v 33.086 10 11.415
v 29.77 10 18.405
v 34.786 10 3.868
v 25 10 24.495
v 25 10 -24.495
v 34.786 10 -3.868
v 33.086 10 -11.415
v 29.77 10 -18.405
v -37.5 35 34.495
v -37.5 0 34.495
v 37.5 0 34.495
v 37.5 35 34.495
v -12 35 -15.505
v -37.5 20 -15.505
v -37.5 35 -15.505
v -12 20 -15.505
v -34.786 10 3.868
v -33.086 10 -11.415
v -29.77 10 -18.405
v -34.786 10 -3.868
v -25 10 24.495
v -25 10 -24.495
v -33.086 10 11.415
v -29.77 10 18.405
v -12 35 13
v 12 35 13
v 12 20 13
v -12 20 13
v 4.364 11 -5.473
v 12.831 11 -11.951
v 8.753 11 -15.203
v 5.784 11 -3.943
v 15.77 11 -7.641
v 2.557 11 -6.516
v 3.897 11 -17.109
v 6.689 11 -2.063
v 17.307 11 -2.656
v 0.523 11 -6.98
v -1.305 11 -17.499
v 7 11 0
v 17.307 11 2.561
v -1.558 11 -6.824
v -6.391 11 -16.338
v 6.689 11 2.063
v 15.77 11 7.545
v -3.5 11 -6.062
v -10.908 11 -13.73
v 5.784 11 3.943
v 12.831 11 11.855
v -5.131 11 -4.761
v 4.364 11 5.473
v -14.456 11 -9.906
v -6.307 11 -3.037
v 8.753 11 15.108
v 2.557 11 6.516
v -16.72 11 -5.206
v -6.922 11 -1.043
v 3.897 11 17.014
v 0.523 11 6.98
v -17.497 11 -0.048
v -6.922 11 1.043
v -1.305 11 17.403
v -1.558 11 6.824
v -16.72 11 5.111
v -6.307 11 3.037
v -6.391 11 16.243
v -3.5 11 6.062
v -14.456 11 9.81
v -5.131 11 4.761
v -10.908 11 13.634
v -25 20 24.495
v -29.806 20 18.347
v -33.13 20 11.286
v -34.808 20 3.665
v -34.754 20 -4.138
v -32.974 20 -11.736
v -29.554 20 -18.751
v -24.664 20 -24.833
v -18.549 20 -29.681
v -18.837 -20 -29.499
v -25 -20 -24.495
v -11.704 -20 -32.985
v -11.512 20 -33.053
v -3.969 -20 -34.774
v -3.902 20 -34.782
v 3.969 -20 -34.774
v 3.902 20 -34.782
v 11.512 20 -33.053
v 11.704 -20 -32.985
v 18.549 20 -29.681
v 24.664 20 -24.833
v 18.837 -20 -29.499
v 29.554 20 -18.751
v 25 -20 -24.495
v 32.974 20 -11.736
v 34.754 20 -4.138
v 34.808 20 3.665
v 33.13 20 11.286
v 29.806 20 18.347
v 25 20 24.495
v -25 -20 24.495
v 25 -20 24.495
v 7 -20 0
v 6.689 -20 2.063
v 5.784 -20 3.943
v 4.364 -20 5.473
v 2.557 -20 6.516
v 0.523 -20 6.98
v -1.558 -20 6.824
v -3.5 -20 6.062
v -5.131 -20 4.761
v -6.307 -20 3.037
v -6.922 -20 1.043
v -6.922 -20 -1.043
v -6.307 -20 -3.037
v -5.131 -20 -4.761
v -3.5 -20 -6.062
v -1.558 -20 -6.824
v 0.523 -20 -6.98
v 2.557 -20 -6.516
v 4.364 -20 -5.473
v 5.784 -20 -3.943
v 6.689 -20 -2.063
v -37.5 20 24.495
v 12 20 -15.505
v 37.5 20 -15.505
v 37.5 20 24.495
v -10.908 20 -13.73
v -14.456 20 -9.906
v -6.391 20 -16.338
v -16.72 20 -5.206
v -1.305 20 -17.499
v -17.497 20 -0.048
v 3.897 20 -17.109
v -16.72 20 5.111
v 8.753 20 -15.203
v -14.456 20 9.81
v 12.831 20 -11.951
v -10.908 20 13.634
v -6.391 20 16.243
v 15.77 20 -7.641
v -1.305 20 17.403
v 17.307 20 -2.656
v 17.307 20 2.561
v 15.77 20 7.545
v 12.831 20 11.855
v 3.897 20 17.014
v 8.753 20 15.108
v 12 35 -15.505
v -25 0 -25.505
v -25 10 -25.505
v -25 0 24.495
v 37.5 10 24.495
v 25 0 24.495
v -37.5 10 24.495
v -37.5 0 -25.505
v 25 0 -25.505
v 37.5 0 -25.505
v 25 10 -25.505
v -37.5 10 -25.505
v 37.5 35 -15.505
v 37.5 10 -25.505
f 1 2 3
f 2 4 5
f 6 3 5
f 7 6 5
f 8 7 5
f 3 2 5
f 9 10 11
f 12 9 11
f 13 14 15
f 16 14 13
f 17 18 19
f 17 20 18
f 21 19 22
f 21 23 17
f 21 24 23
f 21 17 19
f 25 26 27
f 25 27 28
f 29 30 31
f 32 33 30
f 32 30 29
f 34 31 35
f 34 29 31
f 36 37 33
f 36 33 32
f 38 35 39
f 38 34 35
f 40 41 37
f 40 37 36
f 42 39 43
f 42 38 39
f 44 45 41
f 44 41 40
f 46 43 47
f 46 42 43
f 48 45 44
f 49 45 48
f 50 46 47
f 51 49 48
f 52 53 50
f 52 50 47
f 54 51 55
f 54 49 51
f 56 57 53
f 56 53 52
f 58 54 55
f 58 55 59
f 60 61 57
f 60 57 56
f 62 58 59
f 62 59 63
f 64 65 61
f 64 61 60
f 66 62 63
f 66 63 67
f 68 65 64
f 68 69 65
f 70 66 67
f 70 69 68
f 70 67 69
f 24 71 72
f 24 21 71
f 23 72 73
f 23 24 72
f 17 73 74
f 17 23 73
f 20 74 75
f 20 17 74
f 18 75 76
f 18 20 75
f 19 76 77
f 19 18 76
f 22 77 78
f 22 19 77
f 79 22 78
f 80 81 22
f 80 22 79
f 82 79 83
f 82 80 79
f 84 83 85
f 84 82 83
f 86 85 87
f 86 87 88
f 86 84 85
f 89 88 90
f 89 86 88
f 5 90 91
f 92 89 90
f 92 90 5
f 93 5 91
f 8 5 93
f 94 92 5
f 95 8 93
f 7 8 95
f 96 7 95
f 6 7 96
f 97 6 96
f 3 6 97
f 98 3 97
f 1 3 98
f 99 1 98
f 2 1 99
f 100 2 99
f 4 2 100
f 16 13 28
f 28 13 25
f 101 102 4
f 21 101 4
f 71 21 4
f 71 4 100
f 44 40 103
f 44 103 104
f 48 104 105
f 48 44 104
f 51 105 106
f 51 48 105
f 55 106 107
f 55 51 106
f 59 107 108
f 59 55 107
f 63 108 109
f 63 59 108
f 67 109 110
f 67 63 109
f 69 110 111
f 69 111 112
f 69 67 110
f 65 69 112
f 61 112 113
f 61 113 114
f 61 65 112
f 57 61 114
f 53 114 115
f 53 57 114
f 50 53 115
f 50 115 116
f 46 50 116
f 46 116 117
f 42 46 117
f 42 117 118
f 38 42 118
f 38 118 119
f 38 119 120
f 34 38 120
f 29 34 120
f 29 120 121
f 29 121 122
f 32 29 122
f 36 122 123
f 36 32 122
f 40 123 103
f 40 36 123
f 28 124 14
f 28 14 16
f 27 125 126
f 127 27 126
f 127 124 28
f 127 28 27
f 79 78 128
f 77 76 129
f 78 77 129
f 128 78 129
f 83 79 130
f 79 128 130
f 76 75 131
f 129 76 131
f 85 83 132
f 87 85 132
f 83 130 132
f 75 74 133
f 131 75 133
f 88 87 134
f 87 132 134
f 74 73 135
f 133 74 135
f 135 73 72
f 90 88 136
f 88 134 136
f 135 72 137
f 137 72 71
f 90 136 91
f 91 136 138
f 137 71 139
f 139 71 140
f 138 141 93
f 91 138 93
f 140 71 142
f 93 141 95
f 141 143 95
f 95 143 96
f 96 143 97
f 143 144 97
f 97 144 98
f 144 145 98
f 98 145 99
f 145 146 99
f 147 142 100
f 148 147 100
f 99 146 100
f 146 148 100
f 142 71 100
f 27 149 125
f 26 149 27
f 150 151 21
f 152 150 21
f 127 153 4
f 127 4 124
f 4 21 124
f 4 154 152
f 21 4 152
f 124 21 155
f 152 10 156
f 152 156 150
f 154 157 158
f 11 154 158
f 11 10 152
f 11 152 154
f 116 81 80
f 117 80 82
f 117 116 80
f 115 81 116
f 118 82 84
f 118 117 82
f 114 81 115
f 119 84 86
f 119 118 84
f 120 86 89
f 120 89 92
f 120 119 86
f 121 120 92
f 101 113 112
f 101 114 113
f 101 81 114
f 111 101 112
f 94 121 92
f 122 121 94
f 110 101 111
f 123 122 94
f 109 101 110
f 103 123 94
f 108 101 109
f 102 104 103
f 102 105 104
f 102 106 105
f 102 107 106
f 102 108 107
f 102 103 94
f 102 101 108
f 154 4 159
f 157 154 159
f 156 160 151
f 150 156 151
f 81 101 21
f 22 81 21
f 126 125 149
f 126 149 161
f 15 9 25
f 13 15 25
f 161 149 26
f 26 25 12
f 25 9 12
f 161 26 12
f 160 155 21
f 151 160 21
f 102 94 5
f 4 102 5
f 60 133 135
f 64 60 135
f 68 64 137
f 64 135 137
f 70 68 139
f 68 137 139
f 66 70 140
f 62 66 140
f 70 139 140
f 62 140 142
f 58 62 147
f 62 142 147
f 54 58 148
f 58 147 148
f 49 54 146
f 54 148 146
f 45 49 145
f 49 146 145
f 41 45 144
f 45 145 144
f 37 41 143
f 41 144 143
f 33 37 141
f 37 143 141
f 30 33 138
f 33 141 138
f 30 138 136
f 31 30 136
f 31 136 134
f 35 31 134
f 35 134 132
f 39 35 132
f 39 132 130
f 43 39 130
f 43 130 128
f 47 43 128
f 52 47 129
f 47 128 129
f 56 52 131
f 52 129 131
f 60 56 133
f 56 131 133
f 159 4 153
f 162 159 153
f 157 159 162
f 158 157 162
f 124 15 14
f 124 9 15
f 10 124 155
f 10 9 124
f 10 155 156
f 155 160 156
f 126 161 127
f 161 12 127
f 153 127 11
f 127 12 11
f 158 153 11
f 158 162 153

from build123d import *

# Parameters (mm, degrees)
F0_R      = 35
F0_R_2    = 7
F1_DEPTH  = 20
F2_W      = 10
F2_H      = 30
F3_DEPTH  = 35
F5_DEPTH  = 70
F6_R      = 17.5
F6_R_2    = 7
F7_DEPTH  = 9
F9_DEPTH  = 10
F11_DEPTH = 25
F12_W     = 75
F12_H     = 15
F13_DEPTH = 40
F14_W     = 24
F14_H     = 28.5051025722
F15_DEPTH = 25


# Not quite as in the source:
# - a feature names something its author has since deleted; it is built from what else it names


with BuildPart() as f1:
    # F0 (on Front) → F1 (new body, symmetric)
    with BuildSketch(Plane.XZ):
        Circle(F0_R)
        Circle(F0_R_2, mode=Mode.SUBTRACT)
    extrude(amount=F1_DEPTH, both=True)

    # F2 (on Top) → F3 (cut, symmetric)
    with BuildSketch(Plane.XY):
        with Locations((30, -5)):
            Rectangle(F2_W, F2_H)
        with Locations((-30, -5)):
            Rectangle(F2_W, F2_H)
    extrude(amount=F3_DEPTH, both=True, mode=Mode.SUBTRACT)

    # F4 (on face) → F5 (cut)
    with BuildSketch(Plane.YZ.offset(25)):
        Polygon((-20, 35), (-20, 24.4948974278), (10, 24.4948974278), (20, 24.4948974278), (20, 35), align=None)
    extrude(amount=-F5_DEPTH, mode=Mode.SUBTRACT)

    # F6 (on face) → F7 (cut)
    with BuildSketch(Plane(origin=(0, 20, 0), x_dir=(-1, 0, 0), z_dir=(0, 1, 0))):
        with Locations((-0.0028463546, -0.0477097929)):
            Circle(F6_R)
        Circle(F6_R_2, mode=Mode.SUBTRACT)
    extrude(amount=-F7_DEPTH, mode=Mode.SUBTRACT)


with BuildPart() as f9:
    # F8 (on face) → F9 (new body)
    with BuildSketch(Plane.XZ.offset(-10)):
        with BuildLine():
            ThreePointArc((25, -24.4948974278), (35, 0), (25, 24.4948974278))
            Line((25, 24.4948974278), (25, -24.4948974278))
        make_face()
        with BuildLine():
            Line((-37.5, 34.4948974278), (-37.5, -25.5051025722))
            Line((-37.5, -25.5051025722), (-25, -25.5051025722))
            Line((-25, -25.5051025722), (-25, 24.4948974278))
            Line((-25, 24.4948974278), (25, 24.4948974278))
            ThreePointArc((25, 24.4948974278), (35, 0), (25, -24.4948974278))
            Line((25, -24.4948974278), (25, -25.5051025722))
            Line((25, -25.5051025722), (37.5, -25.5051025722))
            Line((37.5, -25.5051025722), (37.5, 34.4948974278))
            Line((37.5, 34.4948974278), (-37.5, 34.4948974278))
        make_face()
    extrude(amount=F9_DEPTH)

    # F10 (on face) → F11 (join)
    with BuildSketch(Plane(origin=(0, 10, 0), x_dir=(-1, 0, 0), z_dir=(0, 1, 0))):
        Polygon((37.5, 34.4948974278), (-37.5, 34.4948974278), (-37.5, 24.4948974278), (-25, 24.4948974278), (25, 24.4948974278), (37.5, 24.4948974278), align=None)
    extrude(amount=F11_DEPTH)

    # F12 (on face) → F13 (join)
    with BuildSketch(Plane(origin=(0, 0, 24.4948974278), x_dir=(1, 0, 0), z_dir=(0, 0, -1))):
        with Locations((0, -27.5)):
            Rectangle(F12_W, F12_H)
    extrude(amount=F13_DEPTH)

    # F14 (on face) → F15 (cut)
    with BuildSketch(Plane(origin=(0, 35, 0), x_dir=(-1, 0, 0), z_dir=(0, 1, 0))):
        with Locations((0, -1.2525512861)):
            Rectangle(F14_W, F14_H)
    extrude(amount=-F15_DEPTH, mode=Mode.SUBTRACT)


solid = Compound([f1.part, f9.part])
